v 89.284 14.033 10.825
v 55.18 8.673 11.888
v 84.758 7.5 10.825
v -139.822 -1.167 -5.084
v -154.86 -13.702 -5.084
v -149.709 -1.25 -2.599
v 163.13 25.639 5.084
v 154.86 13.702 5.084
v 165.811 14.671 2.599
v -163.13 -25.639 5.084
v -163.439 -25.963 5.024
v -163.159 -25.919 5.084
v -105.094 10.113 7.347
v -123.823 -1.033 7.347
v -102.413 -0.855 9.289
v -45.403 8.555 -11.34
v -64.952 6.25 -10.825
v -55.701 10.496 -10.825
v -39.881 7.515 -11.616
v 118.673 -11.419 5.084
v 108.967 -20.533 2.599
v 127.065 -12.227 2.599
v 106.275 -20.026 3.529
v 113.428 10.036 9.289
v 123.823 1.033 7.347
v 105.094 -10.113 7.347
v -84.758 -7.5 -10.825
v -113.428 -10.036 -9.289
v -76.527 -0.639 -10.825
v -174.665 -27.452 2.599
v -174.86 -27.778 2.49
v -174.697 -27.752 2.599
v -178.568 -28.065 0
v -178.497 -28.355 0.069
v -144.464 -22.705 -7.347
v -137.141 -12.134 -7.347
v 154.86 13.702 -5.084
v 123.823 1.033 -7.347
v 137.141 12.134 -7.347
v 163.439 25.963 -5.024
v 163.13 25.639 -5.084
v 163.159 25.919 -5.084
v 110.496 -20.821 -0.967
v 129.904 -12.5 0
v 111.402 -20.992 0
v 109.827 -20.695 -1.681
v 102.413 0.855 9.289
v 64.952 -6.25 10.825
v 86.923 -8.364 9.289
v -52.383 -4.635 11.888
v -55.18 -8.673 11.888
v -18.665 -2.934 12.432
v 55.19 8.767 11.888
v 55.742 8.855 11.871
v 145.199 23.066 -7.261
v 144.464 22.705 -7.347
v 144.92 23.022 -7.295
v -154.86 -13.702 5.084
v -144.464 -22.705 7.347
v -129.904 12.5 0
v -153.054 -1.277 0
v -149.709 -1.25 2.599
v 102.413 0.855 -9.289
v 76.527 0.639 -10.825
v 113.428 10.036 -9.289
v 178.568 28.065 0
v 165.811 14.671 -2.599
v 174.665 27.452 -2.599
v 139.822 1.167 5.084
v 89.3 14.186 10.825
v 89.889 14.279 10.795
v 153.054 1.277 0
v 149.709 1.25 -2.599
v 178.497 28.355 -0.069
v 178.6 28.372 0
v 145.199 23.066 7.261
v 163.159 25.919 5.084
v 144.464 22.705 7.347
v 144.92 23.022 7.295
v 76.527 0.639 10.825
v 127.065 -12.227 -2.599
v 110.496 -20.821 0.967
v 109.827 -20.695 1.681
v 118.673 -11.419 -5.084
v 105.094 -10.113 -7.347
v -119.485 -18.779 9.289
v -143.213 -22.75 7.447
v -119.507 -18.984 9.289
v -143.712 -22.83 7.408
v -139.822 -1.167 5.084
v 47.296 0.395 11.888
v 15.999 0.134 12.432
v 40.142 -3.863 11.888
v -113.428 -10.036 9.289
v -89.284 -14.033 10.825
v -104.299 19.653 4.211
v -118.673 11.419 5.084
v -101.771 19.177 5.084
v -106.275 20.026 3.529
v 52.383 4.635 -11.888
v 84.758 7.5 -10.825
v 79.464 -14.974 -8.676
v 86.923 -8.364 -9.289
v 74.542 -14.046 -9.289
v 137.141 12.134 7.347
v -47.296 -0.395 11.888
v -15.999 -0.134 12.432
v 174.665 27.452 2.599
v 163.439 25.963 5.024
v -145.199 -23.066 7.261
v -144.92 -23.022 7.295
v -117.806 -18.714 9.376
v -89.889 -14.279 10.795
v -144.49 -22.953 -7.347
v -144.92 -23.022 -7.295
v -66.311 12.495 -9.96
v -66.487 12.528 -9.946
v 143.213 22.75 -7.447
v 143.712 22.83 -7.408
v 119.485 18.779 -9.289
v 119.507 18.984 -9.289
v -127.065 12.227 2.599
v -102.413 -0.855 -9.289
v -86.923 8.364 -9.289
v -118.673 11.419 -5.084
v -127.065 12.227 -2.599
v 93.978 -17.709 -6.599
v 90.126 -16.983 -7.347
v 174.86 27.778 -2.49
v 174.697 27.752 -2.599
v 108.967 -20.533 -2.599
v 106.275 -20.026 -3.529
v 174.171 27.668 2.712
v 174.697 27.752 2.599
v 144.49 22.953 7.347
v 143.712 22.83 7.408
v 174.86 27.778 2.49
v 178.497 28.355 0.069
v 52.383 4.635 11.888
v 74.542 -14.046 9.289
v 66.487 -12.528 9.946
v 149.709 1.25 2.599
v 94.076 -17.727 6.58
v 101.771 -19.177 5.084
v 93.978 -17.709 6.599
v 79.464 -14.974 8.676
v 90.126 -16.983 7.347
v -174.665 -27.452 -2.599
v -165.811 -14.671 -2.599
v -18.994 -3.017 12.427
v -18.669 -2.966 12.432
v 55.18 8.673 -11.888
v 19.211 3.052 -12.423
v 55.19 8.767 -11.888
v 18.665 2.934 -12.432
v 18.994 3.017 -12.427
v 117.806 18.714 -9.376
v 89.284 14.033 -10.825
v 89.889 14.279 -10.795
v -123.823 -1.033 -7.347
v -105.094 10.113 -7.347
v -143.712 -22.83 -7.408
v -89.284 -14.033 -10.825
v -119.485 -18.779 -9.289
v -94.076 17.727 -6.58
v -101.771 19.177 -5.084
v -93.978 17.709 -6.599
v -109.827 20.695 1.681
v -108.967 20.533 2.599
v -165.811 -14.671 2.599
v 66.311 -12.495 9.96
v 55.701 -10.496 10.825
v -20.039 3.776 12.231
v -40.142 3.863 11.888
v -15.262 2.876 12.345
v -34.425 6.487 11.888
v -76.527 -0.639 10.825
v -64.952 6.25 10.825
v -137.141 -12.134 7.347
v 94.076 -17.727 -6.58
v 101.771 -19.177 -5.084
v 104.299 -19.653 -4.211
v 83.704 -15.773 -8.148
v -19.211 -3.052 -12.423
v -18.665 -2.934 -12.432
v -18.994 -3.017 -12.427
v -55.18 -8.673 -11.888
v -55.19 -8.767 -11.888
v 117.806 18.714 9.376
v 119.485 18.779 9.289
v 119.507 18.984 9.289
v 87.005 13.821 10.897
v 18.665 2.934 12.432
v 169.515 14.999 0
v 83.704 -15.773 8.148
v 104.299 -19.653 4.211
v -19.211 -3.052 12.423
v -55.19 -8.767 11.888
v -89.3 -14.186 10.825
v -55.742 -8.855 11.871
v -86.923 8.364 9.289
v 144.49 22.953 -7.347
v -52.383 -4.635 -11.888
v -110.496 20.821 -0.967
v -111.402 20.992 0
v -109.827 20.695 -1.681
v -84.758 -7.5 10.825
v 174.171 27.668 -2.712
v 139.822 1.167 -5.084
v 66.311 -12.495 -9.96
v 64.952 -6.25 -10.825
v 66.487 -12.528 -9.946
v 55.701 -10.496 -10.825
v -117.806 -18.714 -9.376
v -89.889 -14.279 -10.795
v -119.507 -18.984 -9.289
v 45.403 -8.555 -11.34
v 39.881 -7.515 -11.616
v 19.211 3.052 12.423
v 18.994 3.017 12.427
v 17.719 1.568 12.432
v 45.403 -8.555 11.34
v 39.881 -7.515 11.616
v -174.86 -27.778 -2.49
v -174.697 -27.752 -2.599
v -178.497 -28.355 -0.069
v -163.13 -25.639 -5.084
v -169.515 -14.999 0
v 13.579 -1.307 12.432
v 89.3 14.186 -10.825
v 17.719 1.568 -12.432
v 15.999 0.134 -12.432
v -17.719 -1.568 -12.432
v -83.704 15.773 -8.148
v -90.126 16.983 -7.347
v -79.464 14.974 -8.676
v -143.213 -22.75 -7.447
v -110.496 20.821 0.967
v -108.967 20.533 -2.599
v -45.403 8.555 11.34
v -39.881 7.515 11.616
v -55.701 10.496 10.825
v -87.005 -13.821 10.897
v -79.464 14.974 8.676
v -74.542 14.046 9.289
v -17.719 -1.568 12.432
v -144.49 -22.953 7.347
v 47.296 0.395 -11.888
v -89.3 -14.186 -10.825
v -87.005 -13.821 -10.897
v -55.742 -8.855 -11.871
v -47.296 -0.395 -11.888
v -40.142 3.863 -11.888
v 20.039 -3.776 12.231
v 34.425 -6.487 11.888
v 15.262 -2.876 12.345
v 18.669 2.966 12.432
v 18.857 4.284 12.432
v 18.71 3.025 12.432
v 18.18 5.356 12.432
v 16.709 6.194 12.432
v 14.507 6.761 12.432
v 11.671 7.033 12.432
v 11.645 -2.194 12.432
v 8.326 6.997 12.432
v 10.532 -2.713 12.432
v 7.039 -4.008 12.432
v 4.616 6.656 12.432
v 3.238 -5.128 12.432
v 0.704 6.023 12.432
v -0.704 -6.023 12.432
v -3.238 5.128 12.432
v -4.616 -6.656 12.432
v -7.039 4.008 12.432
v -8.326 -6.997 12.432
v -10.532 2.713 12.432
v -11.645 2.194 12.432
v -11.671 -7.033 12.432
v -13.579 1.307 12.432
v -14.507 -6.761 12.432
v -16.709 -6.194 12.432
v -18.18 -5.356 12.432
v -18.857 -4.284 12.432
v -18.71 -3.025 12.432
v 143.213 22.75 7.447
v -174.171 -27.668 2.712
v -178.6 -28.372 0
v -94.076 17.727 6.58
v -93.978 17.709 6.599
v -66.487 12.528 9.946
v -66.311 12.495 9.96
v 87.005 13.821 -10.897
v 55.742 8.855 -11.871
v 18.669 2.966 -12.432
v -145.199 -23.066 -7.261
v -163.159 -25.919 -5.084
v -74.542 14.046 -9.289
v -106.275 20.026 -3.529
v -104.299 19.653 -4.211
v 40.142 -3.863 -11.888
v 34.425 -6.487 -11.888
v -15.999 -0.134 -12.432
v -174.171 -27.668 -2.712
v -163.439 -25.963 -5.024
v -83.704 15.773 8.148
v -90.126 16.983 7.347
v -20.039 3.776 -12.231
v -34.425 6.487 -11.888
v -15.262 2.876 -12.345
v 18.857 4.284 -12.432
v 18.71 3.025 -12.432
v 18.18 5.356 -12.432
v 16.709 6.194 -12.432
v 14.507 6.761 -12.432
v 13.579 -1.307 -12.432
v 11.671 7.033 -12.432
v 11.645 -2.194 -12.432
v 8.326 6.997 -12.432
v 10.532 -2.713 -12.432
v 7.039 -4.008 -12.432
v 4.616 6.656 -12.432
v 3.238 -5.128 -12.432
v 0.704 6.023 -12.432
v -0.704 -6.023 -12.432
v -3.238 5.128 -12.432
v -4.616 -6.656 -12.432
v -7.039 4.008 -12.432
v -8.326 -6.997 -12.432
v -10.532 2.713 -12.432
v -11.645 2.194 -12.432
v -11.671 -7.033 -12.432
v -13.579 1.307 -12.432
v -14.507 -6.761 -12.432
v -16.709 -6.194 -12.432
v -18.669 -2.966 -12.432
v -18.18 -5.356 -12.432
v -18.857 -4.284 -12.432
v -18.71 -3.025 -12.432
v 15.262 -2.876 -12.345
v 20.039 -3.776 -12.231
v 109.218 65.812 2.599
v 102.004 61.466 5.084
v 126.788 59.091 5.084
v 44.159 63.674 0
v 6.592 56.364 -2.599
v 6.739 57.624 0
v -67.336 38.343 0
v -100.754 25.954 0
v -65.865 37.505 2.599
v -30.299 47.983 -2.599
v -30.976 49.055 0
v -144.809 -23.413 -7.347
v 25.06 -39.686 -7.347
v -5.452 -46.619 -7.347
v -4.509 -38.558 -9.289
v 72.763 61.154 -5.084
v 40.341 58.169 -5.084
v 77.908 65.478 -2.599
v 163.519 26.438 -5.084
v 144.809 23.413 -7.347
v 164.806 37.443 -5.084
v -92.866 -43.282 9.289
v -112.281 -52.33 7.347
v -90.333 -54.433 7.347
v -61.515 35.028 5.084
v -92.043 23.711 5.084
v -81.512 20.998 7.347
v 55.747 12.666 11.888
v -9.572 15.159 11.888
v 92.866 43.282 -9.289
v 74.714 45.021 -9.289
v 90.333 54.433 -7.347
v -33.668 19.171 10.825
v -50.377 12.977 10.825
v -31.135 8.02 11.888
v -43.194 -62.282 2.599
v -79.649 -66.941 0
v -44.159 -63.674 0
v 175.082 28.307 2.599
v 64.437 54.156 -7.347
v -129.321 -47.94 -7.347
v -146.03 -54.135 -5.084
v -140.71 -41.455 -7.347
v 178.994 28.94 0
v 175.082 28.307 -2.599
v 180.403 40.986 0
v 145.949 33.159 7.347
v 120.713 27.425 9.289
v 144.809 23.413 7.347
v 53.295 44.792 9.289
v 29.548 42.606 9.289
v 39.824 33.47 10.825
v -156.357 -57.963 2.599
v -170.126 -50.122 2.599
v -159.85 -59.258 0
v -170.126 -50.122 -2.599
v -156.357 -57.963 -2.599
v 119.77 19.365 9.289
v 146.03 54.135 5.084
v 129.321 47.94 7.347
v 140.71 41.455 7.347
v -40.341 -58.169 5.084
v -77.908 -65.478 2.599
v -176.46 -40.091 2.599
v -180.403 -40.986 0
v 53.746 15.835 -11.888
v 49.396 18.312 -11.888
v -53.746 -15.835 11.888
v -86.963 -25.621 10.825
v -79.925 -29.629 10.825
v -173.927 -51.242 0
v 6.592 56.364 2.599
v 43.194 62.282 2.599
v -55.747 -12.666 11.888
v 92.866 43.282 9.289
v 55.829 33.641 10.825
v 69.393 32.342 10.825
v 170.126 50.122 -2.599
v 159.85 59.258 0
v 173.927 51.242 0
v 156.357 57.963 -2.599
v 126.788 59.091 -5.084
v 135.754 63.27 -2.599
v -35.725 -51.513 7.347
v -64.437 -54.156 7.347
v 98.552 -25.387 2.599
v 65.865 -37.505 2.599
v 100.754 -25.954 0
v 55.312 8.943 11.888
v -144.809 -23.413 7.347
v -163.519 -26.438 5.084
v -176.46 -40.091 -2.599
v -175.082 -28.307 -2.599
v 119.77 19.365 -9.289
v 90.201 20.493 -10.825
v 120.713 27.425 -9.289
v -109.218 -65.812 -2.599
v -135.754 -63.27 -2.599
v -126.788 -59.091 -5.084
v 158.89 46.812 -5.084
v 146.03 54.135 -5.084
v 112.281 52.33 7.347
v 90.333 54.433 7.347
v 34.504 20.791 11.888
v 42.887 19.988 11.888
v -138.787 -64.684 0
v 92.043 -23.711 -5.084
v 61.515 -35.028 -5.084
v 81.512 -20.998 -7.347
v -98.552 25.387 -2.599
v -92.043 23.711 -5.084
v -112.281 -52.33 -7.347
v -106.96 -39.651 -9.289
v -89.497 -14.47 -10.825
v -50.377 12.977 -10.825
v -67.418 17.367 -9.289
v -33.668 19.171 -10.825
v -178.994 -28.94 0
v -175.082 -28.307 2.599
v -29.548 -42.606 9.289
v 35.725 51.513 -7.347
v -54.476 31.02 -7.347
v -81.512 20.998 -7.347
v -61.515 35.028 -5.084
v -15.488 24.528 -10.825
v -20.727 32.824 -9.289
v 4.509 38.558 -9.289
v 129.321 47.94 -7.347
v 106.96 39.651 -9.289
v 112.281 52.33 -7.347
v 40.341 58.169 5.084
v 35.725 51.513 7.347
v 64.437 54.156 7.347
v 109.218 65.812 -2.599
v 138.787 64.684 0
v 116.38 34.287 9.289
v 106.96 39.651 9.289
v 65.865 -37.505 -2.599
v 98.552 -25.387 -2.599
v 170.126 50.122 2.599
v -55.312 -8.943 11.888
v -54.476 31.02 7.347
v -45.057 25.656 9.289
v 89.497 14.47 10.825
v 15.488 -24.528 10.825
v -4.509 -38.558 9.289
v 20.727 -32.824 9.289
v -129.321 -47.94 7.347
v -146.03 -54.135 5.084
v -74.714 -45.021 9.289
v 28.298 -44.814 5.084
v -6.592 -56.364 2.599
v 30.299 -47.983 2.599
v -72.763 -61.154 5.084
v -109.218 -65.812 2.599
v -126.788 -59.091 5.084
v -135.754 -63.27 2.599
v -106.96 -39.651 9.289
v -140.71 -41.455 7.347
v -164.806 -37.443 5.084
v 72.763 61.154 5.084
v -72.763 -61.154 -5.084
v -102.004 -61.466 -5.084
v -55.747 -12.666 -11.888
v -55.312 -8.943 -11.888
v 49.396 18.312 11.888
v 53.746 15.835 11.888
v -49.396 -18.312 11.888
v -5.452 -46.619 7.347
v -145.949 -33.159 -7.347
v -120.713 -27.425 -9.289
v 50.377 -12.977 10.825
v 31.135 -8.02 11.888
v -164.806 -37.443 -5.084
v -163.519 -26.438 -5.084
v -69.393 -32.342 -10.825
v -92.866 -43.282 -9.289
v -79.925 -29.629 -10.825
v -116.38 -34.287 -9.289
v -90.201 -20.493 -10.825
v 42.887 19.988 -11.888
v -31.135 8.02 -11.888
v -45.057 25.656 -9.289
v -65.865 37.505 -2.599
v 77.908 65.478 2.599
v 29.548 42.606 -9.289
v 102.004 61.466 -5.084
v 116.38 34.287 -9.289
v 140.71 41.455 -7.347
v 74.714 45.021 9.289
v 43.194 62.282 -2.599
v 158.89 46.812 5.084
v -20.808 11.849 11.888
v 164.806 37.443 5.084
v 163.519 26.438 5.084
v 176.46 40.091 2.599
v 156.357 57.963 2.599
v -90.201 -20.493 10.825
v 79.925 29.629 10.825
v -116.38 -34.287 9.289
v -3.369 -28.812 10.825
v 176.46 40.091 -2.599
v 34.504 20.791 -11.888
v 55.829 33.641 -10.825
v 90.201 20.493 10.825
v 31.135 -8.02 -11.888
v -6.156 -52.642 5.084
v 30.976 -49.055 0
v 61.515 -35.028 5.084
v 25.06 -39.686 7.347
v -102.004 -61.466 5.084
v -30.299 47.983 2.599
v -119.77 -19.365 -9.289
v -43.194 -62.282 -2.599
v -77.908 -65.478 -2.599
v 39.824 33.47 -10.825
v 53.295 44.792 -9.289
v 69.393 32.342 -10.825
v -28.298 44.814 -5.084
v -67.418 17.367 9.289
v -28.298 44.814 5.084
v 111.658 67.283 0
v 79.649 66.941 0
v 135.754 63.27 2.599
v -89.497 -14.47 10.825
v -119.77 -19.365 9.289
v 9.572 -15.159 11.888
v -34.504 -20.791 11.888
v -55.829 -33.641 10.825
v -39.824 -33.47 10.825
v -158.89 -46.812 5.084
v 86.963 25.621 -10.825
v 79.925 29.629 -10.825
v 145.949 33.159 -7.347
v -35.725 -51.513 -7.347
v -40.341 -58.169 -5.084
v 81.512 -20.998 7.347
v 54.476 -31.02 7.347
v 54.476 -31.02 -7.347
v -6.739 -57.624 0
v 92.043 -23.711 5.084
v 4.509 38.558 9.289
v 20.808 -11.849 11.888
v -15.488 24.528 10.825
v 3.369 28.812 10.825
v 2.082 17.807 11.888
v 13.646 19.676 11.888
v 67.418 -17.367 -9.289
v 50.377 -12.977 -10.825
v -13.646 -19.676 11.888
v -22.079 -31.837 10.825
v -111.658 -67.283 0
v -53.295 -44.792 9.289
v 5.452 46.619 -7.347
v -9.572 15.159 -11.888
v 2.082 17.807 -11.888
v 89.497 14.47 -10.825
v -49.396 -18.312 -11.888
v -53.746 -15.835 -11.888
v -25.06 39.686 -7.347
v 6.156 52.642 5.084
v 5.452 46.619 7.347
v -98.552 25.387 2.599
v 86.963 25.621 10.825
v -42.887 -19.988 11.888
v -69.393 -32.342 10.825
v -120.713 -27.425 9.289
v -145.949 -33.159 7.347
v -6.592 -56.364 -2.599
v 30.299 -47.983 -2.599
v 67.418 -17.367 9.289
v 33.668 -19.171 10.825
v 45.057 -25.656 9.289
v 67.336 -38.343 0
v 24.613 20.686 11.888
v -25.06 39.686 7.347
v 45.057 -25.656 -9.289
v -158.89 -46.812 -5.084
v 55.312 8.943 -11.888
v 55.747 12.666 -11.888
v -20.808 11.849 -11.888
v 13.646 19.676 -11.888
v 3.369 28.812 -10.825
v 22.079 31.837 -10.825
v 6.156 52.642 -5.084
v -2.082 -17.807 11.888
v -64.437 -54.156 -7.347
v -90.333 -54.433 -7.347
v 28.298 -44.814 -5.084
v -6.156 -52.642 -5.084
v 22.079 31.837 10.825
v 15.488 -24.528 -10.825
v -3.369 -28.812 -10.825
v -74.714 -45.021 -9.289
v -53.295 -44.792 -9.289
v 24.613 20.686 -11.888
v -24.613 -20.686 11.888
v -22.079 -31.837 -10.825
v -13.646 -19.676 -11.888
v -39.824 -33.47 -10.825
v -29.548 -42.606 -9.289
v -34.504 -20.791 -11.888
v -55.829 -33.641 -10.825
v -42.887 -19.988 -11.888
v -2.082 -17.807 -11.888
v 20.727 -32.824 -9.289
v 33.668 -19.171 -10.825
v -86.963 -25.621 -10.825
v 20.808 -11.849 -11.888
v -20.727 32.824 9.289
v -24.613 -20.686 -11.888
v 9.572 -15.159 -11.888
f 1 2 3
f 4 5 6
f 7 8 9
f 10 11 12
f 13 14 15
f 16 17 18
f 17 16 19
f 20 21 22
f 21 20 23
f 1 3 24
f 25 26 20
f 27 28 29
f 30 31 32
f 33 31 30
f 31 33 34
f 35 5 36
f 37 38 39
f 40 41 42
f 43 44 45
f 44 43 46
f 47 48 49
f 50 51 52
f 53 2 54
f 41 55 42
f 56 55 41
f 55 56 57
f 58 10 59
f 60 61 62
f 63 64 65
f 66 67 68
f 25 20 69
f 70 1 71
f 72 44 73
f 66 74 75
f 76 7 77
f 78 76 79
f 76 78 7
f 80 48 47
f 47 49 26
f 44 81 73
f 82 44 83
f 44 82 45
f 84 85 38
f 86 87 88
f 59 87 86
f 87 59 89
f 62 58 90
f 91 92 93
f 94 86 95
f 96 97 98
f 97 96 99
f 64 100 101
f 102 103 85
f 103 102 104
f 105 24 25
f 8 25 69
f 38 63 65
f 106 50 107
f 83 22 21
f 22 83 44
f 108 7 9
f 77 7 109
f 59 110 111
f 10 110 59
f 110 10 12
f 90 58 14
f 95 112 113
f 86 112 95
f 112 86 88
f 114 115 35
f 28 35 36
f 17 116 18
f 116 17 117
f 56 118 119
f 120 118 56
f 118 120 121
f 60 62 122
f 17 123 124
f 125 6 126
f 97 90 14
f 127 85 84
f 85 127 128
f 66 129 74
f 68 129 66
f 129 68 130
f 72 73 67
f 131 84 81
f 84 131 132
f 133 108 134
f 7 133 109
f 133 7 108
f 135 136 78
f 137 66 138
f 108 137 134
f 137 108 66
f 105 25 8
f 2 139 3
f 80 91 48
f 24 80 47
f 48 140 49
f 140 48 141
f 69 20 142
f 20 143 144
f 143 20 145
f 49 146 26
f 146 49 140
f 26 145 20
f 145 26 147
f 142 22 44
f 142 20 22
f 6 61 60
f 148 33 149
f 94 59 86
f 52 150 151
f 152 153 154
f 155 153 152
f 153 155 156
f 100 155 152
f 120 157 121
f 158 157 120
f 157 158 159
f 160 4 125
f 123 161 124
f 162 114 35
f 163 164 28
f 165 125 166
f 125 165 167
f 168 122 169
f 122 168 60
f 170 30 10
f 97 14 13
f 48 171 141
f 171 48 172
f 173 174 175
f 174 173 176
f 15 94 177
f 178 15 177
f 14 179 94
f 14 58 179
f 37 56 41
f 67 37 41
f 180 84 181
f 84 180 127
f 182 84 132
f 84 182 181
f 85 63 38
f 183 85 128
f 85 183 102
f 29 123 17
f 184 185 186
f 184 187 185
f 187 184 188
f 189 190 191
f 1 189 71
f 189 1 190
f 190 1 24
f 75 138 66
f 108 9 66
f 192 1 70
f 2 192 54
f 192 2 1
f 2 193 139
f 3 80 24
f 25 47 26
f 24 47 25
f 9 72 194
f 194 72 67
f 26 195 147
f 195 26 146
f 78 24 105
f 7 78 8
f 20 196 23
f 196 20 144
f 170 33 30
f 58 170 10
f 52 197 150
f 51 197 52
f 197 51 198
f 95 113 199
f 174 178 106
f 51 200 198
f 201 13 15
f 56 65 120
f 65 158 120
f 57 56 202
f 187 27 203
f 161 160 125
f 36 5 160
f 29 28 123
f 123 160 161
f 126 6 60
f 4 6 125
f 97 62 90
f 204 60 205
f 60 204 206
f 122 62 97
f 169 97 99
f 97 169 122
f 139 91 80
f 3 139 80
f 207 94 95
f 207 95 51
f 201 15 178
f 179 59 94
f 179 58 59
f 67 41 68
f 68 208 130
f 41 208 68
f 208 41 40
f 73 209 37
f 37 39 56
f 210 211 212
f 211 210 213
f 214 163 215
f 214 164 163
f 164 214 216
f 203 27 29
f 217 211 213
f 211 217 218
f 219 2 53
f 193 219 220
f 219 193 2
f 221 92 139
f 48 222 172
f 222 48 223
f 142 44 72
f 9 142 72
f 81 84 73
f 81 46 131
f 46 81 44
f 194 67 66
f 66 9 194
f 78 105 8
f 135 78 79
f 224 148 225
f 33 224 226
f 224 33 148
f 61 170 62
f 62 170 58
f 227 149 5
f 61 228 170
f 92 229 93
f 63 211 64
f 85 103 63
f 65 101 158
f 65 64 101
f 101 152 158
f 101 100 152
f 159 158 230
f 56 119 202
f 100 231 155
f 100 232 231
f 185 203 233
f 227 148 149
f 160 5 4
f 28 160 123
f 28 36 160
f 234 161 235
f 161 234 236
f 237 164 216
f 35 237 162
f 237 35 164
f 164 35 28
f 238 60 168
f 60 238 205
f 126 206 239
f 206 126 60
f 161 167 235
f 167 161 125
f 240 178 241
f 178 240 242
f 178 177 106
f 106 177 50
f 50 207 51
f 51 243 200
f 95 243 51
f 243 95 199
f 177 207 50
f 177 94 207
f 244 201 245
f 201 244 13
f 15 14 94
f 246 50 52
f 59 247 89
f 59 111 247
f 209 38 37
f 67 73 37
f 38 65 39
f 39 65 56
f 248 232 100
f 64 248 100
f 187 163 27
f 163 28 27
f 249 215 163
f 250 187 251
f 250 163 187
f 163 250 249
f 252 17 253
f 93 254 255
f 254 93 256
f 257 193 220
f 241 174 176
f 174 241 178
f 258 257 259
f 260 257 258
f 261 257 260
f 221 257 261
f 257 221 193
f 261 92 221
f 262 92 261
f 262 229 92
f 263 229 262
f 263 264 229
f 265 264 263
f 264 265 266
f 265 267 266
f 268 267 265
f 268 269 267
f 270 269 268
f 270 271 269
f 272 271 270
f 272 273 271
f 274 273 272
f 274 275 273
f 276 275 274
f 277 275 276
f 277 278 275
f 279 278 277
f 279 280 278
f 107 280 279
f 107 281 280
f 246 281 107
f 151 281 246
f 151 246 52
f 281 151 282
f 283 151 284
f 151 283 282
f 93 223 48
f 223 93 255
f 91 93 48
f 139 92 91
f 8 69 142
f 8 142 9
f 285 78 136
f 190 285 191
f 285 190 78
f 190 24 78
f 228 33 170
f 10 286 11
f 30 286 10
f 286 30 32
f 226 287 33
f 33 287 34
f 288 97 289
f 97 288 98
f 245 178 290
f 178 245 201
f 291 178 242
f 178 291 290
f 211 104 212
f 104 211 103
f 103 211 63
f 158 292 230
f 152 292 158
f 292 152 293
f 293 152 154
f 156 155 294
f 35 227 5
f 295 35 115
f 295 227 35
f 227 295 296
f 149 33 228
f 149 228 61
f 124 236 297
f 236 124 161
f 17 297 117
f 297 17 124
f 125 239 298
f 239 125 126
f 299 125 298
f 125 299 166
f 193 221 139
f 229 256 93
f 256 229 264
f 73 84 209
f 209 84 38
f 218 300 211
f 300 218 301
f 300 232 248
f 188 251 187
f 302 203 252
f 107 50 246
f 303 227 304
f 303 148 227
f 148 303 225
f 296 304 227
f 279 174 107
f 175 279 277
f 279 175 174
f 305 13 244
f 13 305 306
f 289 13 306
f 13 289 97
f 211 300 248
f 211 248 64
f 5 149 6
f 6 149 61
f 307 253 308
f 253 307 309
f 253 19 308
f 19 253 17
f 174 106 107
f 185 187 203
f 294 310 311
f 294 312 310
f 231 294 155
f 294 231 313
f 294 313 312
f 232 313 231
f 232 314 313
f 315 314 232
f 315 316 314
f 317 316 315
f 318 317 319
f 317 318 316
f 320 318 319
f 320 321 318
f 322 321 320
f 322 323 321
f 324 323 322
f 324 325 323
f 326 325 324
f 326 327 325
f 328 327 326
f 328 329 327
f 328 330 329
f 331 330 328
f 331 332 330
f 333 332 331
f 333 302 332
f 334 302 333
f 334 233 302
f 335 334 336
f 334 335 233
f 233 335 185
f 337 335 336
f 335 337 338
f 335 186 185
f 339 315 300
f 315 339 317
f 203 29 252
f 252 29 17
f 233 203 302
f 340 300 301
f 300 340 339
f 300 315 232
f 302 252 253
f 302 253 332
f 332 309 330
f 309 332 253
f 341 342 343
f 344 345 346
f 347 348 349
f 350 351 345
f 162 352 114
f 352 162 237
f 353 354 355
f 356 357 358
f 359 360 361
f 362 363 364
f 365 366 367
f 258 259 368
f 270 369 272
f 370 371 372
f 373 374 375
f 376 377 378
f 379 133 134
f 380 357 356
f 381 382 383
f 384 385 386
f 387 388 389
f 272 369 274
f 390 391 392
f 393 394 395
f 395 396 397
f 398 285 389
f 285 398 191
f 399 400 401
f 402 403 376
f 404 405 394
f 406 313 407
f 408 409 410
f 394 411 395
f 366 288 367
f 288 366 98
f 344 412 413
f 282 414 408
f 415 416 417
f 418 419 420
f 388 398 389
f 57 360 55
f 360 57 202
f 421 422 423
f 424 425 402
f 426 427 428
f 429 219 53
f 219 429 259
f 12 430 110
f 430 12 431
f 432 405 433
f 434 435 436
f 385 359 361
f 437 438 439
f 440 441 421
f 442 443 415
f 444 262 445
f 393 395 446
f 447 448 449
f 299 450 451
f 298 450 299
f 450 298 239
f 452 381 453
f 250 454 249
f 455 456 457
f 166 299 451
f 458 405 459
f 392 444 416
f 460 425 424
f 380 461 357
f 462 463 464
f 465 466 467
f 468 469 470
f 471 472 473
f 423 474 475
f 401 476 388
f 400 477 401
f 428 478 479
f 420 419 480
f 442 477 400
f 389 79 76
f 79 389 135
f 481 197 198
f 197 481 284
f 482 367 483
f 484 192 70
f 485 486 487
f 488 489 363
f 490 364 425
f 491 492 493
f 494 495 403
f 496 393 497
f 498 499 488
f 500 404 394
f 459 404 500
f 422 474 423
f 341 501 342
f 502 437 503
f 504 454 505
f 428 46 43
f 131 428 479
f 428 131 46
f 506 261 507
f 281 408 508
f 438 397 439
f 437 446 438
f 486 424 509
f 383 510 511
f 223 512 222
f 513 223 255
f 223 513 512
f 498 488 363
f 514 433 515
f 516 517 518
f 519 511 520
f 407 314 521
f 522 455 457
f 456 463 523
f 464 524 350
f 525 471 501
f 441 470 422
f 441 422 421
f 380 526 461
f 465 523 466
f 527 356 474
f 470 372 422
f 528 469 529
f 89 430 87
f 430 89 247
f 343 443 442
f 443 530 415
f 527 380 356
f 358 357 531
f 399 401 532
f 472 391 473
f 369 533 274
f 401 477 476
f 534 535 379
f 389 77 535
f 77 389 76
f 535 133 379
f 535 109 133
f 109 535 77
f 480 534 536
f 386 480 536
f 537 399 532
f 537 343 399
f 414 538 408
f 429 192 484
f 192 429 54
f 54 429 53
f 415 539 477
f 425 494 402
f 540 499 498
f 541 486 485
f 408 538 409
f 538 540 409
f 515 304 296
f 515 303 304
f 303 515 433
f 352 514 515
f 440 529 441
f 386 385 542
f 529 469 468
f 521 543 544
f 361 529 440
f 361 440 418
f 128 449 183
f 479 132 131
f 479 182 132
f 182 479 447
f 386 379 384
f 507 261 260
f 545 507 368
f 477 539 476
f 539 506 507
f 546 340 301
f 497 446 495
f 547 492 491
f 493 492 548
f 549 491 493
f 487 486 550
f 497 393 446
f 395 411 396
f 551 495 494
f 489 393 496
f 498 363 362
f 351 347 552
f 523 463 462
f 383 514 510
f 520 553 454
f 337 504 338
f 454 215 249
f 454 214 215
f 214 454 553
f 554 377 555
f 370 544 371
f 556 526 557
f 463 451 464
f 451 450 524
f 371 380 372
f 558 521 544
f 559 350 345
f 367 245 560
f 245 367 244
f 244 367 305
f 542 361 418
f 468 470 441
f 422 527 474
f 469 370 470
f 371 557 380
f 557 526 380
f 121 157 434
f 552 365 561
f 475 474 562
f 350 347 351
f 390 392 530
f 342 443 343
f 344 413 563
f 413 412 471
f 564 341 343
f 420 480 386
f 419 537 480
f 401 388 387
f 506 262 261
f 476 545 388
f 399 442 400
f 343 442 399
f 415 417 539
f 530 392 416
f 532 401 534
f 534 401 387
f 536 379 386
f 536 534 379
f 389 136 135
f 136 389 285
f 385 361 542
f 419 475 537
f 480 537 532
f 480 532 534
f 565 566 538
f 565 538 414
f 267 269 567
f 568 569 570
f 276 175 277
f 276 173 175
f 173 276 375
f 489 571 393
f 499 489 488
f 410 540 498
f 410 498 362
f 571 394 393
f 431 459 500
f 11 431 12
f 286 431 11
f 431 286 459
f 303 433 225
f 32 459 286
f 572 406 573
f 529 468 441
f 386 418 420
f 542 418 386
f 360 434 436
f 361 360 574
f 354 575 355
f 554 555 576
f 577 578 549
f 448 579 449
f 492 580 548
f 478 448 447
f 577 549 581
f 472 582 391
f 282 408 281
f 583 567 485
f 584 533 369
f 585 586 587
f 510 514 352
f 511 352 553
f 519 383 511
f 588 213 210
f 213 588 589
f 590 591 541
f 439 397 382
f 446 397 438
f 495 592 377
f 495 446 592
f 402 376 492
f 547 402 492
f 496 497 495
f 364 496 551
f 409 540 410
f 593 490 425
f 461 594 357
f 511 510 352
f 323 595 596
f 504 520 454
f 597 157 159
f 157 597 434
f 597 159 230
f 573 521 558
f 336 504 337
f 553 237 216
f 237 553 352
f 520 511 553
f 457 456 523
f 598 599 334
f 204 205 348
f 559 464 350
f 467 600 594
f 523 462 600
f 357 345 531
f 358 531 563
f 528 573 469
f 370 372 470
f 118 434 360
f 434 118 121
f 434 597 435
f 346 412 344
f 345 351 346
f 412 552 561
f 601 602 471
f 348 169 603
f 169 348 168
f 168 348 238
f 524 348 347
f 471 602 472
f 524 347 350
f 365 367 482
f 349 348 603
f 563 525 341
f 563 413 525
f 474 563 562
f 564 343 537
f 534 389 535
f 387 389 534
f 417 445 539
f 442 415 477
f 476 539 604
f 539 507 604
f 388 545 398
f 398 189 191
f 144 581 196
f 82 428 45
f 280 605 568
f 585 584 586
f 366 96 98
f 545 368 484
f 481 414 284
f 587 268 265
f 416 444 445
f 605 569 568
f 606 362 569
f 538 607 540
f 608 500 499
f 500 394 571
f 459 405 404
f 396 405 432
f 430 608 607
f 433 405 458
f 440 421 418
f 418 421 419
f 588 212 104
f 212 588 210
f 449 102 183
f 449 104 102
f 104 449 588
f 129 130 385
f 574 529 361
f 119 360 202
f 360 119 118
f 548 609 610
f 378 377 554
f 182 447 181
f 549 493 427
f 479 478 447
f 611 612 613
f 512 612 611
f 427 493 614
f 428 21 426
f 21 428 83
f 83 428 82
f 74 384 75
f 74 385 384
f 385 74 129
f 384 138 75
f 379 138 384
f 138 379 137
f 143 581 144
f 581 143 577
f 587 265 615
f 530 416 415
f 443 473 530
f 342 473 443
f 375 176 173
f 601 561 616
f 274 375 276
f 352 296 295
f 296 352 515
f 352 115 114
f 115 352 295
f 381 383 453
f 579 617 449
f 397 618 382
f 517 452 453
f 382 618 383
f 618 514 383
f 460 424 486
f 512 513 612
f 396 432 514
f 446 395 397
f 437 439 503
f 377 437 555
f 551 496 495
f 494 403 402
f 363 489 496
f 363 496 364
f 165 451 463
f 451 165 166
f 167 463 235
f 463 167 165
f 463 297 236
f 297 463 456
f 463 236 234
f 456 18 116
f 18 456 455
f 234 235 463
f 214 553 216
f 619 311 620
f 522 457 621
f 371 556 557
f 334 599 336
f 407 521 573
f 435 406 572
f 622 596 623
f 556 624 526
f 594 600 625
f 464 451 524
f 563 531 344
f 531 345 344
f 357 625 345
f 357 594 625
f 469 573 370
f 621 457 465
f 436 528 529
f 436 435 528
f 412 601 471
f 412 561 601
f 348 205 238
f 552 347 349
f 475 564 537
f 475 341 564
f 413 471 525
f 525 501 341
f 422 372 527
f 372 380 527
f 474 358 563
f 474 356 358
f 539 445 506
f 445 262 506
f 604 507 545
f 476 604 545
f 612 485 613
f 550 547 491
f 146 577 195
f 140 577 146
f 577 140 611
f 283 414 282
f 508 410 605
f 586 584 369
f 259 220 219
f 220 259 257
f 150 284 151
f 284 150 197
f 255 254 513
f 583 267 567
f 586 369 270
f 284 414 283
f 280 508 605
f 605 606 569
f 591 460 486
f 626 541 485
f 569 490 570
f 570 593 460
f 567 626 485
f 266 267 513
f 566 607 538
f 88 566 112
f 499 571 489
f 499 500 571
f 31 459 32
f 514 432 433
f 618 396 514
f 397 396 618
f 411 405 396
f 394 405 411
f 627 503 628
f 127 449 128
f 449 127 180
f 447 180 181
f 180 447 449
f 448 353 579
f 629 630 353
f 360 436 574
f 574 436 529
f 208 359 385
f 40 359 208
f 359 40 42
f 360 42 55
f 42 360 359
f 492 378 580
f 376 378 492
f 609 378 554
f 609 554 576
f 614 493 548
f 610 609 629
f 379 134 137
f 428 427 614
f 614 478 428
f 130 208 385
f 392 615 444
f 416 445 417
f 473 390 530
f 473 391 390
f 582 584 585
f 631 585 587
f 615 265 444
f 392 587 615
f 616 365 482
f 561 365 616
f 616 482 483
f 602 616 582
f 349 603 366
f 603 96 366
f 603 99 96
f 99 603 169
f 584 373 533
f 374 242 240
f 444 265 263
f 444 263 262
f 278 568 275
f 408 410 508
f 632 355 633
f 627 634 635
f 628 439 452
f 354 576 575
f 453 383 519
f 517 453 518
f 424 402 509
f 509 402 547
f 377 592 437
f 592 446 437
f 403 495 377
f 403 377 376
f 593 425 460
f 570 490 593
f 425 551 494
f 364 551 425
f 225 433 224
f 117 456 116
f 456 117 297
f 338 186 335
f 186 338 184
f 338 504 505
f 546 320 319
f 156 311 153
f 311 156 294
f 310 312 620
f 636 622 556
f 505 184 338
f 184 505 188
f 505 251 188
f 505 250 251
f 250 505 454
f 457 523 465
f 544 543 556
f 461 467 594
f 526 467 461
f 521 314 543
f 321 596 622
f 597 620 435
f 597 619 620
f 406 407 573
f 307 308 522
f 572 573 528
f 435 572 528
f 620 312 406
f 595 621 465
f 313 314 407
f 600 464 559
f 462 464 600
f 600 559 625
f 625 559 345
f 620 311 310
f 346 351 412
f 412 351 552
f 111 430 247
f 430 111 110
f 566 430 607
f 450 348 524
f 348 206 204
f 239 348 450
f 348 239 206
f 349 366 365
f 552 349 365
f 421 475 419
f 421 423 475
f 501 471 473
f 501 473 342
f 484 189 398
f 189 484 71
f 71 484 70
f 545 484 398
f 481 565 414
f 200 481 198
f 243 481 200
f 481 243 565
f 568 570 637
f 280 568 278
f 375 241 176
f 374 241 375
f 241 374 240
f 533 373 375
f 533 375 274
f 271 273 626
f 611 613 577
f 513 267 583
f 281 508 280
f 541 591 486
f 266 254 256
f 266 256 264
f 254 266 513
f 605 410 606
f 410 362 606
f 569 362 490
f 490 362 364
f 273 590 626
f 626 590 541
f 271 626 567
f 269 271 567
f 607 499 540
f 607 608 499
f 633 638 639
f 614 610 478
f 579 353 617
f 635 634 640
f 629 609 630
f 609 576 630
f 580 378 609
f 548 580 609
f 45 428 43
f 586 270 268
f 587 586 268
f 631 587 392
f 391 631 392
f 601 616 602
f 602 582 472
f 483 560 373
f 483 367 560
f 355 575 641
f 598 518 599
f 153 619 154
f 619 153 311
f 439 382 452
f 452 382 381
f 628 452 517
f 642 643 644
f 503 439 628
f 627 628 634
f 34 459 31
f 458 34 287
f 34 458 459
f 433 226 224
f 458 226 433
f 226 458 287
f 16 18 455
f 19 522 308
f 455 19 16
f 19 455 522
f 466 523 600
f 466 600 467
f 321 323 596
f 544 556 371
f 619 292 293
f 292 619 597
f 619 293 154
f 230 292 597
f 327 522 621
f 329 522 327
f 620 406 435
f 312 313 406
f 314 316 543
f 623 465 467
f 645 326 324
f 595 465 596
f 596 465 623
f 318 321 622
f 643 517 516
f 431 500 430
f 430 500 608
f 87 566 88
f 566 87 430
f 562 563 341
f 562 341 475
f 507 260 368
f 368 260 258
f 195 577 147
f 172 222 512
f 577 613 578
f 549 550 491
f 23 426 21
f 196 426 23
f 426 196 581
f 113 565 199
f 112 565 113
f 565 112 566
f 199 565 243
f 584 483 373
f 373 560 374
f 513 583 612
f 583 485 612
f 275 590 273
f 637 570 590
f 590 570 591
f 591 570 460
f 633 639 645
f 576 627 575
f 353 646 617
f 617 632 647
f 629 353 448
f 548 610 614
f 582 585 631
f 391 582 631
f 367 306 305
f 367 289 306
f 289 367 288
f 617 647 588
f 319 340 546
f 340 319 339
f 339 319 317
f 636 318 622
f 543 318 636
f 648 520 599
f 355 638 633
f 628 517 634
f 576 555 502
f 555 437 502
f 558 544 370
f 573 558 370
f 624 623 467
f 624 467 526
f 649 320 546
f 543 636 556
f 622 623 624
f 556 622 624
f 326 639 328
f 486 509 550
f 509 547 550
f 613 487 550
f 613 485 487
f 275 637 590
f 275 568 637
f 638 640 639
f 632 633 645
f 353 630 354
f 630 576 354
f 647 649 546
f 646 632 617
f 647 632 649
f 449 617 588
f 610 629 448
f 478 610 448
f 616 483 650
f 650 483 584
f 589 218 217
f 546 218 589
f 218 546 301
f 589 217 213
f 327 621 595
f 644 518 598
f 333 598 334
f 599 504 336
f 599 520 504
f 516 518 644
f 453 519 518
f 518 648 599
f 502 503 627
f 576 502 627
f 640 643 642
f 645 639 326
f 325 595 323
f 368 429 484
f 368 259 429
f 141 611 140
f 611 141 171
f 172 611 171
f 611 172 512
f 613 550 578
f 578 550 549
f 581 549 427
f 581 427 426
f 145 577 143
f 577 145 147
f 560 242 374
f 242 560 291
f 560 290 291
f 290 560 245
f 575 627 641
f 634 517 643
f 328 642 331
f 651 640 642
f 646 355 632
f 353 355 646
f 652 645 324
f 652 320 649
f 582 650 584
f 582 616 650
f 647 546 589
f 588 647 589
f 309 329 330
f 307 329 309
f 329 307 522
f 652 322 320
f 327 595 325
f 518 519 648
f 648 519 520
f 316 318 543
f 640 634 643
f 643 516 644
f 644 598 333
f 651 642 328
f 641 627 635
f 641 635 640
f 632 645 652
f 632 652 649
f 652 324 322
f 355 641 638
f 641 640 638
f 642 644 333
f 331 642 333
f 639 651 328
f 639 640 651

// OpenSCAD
color("green")
scale([2,1,0.5]) rotate([0,0,30])
scale([2,1,0.5]) 
sphere(50);

color("red")
rotate([0,0,12.8])
scale ([3.7,1.1,0.25])
sphere(50);
